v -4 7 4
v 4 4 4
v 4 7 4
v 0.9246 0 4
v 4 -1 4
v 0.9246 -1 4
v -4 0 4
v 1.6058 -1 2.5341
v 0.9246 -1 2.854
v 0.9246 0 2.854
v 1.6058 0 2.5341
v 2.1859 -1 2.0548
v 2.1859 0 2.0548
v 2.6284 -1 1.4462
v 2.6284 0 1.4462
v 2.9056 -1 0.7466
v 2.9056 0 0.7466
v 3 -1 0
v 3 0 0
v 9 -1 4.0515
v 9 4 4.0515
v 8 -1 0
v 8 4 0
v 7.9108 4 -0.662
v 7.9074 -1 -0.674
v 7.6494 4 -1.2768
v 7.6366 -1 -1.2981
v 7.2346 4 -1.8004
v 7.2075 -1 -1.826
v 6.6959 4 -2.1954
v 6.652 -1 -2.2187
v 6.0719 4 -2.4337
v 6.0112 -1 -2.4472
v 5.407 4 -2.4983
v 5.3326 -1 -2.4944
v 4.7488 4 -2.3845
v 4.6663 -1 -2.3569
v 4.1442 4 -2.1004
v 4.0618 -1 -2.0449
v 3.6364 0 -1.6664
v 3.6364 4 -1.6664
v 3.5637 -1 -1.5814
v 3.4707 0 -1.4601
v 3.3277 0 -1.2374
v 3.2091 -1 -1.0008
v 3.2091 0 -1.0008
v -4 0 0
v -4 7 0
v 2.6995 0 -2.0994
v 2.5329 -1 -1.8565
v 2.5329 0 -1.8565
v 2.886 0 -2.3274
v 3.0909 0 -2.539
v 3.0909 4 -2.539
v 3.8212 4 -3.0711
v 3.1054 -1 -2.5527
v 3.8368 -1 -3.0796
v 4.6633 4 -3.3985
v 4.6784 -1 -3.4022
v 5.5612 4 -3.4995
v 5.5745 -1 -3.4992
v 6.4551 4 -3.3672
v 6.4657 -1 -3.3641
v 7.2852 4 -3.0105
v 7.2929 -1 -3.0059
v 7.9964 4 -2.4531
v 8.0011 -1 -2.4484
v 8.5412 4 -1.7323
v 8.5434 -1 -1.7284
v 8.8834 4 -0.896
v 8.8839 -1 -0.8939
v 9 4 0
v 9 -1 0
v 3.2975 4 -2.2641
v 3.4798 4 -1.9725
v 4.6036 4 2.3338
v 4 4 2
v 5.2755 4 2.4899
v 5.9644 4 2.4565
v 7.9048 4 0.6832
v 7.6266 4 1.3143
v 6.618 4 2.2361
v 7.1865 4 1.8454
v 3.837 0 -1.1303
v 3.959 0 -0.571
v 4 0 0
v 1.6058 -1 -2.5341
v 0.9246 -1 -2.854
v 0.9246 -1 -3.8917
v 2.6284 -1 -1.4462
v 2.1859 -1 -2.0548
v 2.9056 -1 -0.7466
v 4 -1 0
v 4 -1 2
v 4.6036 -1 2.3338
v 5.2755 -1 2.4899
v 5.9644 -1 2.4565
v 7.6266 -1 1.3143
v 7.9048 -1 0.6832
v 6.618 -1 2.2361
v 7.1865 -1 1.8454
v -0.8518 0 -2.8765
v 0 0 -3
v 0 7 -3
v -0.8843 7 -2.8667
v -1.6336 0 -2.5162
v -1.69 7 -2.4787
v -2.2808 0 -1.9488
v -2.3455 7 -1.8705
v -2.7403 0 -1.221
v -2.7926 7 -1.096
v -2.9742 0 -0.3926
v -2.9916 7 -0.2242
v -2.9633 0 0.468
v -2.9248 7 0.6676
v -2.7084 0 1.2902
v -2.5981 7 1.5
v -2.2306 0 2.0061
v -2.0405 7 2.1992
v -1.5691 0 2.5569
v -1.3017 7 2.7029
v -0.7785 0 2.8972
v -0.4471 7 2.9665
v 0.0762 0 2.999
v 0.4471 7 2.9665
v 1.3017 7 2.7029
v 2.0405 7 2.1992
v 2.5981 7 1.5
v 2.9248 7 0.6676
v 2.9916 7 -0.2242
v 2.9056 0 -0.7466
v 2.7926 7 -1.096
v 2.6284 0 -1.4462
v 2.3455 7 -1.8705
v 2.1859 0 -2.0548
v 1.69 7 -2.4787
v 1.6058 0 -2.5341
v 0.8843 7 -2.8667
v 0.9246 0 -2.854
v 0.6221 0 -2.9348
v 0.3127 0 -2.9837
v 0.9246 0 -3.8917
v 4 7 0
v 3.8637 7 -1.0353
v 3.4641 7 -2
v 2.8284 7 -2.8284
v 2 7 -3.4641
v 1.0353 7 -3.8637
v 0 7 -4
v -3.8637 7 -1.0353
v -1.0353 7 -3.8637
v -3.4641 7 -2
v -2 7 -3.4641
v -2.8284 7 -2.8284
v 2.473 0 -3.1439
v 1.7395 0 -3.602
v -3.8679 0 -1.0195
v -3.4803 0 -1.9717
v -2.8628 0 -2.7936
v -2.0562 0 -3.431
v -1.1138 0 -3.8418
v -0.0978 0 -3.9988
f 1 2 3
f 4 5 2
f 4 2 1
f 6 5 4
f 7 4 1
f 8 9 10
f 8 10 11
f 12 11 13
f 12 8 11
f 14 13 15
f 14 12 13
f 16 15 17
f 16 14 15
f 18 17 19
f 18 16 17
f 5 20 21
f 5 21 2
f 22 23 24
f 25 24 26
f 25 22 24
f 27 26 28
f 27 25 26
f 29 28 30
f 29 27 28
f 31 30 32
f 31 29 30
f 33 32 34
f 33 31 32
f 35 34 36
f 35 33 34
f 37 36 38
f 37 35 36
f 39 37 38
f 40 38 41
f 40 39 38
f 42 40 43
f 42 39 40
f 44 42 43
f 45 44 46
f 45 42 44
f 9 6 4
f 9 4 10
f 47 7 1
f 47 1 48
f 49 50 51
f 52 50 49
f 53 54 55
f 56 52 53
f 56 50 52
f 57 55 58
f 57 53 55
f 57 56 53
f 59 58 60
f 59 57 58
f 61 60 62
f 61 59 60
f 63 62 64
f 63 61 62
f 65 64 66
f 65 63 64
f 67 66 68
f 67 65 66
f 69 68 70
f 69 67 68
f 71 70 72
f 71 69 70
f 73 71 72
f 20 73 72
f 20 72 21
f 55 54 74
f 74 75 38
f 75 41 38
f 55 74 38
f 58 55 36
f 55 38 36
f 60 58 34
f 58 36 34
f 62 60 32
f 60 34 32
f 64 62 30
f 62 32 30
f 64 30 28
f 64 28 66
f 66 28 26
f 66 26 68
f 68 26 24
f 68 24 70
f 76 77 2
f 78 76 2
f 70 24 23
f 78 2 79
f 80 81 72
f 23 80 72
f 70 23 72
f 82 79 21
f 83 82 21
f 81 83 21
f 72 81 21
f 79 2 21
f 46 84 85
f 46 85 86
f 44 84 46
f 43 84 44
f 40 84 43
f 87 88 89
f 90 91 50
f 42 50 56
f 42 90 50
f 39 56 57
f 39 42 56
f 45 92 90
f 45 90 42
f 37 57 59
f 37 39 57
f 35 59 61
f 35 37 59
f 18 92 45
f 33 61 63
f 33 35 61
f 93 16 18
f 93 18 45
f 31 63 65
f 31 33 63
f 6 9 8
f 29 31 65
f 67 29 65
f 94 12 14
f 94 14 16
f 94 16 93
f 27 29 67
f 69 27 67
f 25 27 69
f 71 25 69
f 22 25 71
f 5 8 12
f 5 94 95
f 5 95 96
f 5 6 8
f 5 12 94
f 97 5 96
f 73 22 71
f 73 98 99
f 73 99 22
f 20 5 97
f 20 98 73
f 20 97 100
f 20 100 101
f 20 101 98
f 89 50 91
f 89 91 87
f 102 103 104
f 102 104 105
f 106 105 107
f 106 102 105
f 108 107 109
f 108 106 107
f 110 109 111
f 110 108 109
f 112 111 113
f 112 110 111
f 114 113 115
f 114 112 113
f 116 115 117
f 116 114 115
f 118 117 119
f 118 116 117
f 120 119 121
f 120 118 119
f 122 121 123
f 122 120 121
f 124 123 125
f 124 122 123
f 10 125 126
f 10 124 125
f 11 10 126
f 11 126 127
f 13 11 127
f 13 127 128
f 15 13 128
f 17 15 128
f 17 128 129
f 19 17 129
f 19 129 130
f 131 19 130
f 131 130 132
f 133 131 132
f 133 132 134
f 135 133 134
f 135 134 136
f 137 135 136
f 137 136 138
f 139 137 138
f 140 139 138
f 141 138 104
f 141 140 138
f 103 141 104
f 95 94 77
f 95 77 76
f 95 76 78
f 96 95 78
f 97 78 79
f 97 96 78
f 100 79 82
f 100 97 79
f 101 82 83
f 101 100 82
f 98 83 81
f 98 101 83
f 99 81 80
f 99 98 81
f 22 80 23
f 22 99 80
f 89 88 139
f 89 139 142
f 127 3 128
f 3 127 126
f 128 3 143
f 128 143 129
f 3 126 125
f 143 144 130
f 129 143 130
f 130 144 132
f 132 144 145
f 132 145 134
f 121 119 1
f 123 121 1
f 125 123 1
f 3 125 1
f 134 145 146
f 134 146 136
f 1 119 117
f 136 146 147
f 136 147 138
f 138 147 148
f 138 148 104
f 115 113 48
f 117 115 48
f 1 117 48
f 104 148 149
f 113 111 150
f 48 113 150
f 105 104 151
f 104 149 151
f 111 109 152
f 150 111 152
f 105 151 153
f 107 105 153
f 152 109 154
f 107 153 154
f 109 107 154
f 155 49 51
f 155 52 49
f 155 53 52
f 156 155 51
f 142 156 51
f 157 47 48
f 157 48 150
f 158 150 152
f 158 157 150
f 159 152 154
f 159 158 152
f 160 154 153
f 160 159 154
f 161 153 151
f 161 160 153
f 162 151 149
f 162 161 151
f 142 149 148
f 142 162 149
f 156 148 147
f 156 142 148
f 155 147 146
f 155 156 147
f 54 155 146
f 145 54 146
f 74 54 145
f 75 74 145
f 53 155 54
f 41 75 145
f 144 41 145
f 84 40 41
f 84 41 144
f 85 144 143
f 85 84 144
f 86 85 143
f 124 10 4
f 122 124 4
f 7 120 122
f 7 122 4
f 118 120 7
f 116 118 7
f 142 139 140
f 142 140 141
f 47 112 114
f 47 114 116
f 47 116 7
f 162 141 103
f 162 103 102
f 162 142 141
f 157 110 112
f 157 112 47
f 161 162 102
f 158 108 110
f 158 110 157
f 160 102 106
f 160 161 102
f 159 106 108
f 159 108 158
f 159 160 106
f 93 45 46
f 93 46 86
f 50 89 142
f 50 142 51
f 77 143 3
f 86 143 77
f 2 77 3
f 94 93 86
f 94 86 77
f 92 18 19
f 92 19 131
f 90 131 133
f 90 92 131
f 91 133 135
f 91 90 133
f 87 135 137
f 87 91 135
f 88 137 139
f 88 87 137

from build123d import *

# Parameters (mm, degrees)
SKETCH1_R           = 3
BOSS_EXTRUDE1_DEPTH = 7
BOSS_EXTRUDE2_START = 1
BOSS_EXTRUDE2_DEPTH = 1
BOSS_EXTRUDE6_DEPTH = 5


with BuildPart() as part:
    # Sketch1 → Boss-Extrude1 (new body)
    with BuildSketch(Plane(origin=(0, 0, 0), x_dir=(1, 0, 0), z_dir=(0, 1, 0))):
        with BuildLine():
            Line((4, 0), (4, -4))
            Line((4, -4), (-4, -4))
            Line((-4, -4), (-4, 0))
            ThreePointArc((-4, 0), (0, 4), (4, 0))
        make_face()
        with Locations(Location((0, 0, 0), (0, 0, 90))):
            Circle(SKETCH1_R, mode=Mode.SUBTRACT)
    extrude(amount=BOSS_EXTRUDE1_DEPTH)

    # Sketch4 → Boss-Extrude2 (add)
    with BuildSketch(Plane.XZ.offset(BOSS_EXTRUDE2_START)):
        with BuildLine():
            Line((4, 0), (4, 4))
            Line((4, 4), (0.924622027, 4))
            Line((0.924622027, 4), (0.924622027, 2.853957622))
            ThreePointArc((0.924622027, 2.853957622), (2.426300278, 1.764388551), (3, 0))
            ThreePointArc((3, 0), (2.426300278, -1.764388551), (0.924622027, -2.853957622))
            Line((0.924622027, -2.853957622), (0.924622027, -3.891667266))
            Line((0.924622027, -3.891667266), (4, 0))
        make_face()
    extrude(amount=-BOSS_EXTRUDE2_DEPTH)

    # Sketch6 → Boss-Extrude6 (add)
    with BuildSketch(Plane.XZ.offset(1)):
        with BuildLine():
            Line((3.209082629, -1.000848439), (2.532928766, -1.856472001))
            ThreePointArc((2.532928766, -1.856472001), (6.465725292, -3.364130595), (9, 0))
            Line((9, 0), (9, 4.051493621))
            Line((9, 4.051493621), (4, 4))
            Line((4, 4), (4, 2))
            ThreePointArc((4, 2), (6.618033989, 2.236067977), (8, 0))
            ThreePointArc((8, 0), (6.011227235, -2.447171166), (3.209082629, -1.000848439))
        make_face()
    extrude(amount=-BOSS_EXTRUDE6_DEPTH)


solid = part.part
